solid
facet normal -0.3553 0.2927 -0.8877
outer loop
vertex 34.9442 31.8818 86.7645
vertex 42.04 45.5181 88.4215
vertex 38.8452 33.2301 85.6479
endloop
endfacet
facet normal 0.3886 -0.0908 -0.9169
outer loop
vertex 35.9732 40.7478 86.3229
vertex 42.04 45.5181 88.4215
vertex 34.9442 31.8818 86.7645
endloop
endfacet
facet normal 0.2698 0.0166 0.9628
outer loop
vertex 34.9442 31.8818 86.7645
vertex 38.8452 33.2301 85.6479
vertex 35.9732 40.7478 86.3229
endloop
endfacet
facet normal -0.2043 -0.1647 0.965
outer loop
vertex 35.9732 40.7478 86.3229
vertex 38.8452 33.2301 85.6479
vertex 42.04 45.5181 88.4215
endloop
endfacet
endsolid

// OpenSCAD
// Auto-generated auxetic polyhedron
points = [
    [38.845174, 33.230070, 85.647898],
    [42.040002, 45.518078, 88.421479],
    [34.944165, 31.881784, 86.764488],
    [35.973174, 40.747794, 86.322861],
];

faces = [
    [0, 1, 2],
    [2, 1, 3],
    [3, 0, 2],
    [1, 0, 3],
];

polyhedron(points = points, faces = faces);
